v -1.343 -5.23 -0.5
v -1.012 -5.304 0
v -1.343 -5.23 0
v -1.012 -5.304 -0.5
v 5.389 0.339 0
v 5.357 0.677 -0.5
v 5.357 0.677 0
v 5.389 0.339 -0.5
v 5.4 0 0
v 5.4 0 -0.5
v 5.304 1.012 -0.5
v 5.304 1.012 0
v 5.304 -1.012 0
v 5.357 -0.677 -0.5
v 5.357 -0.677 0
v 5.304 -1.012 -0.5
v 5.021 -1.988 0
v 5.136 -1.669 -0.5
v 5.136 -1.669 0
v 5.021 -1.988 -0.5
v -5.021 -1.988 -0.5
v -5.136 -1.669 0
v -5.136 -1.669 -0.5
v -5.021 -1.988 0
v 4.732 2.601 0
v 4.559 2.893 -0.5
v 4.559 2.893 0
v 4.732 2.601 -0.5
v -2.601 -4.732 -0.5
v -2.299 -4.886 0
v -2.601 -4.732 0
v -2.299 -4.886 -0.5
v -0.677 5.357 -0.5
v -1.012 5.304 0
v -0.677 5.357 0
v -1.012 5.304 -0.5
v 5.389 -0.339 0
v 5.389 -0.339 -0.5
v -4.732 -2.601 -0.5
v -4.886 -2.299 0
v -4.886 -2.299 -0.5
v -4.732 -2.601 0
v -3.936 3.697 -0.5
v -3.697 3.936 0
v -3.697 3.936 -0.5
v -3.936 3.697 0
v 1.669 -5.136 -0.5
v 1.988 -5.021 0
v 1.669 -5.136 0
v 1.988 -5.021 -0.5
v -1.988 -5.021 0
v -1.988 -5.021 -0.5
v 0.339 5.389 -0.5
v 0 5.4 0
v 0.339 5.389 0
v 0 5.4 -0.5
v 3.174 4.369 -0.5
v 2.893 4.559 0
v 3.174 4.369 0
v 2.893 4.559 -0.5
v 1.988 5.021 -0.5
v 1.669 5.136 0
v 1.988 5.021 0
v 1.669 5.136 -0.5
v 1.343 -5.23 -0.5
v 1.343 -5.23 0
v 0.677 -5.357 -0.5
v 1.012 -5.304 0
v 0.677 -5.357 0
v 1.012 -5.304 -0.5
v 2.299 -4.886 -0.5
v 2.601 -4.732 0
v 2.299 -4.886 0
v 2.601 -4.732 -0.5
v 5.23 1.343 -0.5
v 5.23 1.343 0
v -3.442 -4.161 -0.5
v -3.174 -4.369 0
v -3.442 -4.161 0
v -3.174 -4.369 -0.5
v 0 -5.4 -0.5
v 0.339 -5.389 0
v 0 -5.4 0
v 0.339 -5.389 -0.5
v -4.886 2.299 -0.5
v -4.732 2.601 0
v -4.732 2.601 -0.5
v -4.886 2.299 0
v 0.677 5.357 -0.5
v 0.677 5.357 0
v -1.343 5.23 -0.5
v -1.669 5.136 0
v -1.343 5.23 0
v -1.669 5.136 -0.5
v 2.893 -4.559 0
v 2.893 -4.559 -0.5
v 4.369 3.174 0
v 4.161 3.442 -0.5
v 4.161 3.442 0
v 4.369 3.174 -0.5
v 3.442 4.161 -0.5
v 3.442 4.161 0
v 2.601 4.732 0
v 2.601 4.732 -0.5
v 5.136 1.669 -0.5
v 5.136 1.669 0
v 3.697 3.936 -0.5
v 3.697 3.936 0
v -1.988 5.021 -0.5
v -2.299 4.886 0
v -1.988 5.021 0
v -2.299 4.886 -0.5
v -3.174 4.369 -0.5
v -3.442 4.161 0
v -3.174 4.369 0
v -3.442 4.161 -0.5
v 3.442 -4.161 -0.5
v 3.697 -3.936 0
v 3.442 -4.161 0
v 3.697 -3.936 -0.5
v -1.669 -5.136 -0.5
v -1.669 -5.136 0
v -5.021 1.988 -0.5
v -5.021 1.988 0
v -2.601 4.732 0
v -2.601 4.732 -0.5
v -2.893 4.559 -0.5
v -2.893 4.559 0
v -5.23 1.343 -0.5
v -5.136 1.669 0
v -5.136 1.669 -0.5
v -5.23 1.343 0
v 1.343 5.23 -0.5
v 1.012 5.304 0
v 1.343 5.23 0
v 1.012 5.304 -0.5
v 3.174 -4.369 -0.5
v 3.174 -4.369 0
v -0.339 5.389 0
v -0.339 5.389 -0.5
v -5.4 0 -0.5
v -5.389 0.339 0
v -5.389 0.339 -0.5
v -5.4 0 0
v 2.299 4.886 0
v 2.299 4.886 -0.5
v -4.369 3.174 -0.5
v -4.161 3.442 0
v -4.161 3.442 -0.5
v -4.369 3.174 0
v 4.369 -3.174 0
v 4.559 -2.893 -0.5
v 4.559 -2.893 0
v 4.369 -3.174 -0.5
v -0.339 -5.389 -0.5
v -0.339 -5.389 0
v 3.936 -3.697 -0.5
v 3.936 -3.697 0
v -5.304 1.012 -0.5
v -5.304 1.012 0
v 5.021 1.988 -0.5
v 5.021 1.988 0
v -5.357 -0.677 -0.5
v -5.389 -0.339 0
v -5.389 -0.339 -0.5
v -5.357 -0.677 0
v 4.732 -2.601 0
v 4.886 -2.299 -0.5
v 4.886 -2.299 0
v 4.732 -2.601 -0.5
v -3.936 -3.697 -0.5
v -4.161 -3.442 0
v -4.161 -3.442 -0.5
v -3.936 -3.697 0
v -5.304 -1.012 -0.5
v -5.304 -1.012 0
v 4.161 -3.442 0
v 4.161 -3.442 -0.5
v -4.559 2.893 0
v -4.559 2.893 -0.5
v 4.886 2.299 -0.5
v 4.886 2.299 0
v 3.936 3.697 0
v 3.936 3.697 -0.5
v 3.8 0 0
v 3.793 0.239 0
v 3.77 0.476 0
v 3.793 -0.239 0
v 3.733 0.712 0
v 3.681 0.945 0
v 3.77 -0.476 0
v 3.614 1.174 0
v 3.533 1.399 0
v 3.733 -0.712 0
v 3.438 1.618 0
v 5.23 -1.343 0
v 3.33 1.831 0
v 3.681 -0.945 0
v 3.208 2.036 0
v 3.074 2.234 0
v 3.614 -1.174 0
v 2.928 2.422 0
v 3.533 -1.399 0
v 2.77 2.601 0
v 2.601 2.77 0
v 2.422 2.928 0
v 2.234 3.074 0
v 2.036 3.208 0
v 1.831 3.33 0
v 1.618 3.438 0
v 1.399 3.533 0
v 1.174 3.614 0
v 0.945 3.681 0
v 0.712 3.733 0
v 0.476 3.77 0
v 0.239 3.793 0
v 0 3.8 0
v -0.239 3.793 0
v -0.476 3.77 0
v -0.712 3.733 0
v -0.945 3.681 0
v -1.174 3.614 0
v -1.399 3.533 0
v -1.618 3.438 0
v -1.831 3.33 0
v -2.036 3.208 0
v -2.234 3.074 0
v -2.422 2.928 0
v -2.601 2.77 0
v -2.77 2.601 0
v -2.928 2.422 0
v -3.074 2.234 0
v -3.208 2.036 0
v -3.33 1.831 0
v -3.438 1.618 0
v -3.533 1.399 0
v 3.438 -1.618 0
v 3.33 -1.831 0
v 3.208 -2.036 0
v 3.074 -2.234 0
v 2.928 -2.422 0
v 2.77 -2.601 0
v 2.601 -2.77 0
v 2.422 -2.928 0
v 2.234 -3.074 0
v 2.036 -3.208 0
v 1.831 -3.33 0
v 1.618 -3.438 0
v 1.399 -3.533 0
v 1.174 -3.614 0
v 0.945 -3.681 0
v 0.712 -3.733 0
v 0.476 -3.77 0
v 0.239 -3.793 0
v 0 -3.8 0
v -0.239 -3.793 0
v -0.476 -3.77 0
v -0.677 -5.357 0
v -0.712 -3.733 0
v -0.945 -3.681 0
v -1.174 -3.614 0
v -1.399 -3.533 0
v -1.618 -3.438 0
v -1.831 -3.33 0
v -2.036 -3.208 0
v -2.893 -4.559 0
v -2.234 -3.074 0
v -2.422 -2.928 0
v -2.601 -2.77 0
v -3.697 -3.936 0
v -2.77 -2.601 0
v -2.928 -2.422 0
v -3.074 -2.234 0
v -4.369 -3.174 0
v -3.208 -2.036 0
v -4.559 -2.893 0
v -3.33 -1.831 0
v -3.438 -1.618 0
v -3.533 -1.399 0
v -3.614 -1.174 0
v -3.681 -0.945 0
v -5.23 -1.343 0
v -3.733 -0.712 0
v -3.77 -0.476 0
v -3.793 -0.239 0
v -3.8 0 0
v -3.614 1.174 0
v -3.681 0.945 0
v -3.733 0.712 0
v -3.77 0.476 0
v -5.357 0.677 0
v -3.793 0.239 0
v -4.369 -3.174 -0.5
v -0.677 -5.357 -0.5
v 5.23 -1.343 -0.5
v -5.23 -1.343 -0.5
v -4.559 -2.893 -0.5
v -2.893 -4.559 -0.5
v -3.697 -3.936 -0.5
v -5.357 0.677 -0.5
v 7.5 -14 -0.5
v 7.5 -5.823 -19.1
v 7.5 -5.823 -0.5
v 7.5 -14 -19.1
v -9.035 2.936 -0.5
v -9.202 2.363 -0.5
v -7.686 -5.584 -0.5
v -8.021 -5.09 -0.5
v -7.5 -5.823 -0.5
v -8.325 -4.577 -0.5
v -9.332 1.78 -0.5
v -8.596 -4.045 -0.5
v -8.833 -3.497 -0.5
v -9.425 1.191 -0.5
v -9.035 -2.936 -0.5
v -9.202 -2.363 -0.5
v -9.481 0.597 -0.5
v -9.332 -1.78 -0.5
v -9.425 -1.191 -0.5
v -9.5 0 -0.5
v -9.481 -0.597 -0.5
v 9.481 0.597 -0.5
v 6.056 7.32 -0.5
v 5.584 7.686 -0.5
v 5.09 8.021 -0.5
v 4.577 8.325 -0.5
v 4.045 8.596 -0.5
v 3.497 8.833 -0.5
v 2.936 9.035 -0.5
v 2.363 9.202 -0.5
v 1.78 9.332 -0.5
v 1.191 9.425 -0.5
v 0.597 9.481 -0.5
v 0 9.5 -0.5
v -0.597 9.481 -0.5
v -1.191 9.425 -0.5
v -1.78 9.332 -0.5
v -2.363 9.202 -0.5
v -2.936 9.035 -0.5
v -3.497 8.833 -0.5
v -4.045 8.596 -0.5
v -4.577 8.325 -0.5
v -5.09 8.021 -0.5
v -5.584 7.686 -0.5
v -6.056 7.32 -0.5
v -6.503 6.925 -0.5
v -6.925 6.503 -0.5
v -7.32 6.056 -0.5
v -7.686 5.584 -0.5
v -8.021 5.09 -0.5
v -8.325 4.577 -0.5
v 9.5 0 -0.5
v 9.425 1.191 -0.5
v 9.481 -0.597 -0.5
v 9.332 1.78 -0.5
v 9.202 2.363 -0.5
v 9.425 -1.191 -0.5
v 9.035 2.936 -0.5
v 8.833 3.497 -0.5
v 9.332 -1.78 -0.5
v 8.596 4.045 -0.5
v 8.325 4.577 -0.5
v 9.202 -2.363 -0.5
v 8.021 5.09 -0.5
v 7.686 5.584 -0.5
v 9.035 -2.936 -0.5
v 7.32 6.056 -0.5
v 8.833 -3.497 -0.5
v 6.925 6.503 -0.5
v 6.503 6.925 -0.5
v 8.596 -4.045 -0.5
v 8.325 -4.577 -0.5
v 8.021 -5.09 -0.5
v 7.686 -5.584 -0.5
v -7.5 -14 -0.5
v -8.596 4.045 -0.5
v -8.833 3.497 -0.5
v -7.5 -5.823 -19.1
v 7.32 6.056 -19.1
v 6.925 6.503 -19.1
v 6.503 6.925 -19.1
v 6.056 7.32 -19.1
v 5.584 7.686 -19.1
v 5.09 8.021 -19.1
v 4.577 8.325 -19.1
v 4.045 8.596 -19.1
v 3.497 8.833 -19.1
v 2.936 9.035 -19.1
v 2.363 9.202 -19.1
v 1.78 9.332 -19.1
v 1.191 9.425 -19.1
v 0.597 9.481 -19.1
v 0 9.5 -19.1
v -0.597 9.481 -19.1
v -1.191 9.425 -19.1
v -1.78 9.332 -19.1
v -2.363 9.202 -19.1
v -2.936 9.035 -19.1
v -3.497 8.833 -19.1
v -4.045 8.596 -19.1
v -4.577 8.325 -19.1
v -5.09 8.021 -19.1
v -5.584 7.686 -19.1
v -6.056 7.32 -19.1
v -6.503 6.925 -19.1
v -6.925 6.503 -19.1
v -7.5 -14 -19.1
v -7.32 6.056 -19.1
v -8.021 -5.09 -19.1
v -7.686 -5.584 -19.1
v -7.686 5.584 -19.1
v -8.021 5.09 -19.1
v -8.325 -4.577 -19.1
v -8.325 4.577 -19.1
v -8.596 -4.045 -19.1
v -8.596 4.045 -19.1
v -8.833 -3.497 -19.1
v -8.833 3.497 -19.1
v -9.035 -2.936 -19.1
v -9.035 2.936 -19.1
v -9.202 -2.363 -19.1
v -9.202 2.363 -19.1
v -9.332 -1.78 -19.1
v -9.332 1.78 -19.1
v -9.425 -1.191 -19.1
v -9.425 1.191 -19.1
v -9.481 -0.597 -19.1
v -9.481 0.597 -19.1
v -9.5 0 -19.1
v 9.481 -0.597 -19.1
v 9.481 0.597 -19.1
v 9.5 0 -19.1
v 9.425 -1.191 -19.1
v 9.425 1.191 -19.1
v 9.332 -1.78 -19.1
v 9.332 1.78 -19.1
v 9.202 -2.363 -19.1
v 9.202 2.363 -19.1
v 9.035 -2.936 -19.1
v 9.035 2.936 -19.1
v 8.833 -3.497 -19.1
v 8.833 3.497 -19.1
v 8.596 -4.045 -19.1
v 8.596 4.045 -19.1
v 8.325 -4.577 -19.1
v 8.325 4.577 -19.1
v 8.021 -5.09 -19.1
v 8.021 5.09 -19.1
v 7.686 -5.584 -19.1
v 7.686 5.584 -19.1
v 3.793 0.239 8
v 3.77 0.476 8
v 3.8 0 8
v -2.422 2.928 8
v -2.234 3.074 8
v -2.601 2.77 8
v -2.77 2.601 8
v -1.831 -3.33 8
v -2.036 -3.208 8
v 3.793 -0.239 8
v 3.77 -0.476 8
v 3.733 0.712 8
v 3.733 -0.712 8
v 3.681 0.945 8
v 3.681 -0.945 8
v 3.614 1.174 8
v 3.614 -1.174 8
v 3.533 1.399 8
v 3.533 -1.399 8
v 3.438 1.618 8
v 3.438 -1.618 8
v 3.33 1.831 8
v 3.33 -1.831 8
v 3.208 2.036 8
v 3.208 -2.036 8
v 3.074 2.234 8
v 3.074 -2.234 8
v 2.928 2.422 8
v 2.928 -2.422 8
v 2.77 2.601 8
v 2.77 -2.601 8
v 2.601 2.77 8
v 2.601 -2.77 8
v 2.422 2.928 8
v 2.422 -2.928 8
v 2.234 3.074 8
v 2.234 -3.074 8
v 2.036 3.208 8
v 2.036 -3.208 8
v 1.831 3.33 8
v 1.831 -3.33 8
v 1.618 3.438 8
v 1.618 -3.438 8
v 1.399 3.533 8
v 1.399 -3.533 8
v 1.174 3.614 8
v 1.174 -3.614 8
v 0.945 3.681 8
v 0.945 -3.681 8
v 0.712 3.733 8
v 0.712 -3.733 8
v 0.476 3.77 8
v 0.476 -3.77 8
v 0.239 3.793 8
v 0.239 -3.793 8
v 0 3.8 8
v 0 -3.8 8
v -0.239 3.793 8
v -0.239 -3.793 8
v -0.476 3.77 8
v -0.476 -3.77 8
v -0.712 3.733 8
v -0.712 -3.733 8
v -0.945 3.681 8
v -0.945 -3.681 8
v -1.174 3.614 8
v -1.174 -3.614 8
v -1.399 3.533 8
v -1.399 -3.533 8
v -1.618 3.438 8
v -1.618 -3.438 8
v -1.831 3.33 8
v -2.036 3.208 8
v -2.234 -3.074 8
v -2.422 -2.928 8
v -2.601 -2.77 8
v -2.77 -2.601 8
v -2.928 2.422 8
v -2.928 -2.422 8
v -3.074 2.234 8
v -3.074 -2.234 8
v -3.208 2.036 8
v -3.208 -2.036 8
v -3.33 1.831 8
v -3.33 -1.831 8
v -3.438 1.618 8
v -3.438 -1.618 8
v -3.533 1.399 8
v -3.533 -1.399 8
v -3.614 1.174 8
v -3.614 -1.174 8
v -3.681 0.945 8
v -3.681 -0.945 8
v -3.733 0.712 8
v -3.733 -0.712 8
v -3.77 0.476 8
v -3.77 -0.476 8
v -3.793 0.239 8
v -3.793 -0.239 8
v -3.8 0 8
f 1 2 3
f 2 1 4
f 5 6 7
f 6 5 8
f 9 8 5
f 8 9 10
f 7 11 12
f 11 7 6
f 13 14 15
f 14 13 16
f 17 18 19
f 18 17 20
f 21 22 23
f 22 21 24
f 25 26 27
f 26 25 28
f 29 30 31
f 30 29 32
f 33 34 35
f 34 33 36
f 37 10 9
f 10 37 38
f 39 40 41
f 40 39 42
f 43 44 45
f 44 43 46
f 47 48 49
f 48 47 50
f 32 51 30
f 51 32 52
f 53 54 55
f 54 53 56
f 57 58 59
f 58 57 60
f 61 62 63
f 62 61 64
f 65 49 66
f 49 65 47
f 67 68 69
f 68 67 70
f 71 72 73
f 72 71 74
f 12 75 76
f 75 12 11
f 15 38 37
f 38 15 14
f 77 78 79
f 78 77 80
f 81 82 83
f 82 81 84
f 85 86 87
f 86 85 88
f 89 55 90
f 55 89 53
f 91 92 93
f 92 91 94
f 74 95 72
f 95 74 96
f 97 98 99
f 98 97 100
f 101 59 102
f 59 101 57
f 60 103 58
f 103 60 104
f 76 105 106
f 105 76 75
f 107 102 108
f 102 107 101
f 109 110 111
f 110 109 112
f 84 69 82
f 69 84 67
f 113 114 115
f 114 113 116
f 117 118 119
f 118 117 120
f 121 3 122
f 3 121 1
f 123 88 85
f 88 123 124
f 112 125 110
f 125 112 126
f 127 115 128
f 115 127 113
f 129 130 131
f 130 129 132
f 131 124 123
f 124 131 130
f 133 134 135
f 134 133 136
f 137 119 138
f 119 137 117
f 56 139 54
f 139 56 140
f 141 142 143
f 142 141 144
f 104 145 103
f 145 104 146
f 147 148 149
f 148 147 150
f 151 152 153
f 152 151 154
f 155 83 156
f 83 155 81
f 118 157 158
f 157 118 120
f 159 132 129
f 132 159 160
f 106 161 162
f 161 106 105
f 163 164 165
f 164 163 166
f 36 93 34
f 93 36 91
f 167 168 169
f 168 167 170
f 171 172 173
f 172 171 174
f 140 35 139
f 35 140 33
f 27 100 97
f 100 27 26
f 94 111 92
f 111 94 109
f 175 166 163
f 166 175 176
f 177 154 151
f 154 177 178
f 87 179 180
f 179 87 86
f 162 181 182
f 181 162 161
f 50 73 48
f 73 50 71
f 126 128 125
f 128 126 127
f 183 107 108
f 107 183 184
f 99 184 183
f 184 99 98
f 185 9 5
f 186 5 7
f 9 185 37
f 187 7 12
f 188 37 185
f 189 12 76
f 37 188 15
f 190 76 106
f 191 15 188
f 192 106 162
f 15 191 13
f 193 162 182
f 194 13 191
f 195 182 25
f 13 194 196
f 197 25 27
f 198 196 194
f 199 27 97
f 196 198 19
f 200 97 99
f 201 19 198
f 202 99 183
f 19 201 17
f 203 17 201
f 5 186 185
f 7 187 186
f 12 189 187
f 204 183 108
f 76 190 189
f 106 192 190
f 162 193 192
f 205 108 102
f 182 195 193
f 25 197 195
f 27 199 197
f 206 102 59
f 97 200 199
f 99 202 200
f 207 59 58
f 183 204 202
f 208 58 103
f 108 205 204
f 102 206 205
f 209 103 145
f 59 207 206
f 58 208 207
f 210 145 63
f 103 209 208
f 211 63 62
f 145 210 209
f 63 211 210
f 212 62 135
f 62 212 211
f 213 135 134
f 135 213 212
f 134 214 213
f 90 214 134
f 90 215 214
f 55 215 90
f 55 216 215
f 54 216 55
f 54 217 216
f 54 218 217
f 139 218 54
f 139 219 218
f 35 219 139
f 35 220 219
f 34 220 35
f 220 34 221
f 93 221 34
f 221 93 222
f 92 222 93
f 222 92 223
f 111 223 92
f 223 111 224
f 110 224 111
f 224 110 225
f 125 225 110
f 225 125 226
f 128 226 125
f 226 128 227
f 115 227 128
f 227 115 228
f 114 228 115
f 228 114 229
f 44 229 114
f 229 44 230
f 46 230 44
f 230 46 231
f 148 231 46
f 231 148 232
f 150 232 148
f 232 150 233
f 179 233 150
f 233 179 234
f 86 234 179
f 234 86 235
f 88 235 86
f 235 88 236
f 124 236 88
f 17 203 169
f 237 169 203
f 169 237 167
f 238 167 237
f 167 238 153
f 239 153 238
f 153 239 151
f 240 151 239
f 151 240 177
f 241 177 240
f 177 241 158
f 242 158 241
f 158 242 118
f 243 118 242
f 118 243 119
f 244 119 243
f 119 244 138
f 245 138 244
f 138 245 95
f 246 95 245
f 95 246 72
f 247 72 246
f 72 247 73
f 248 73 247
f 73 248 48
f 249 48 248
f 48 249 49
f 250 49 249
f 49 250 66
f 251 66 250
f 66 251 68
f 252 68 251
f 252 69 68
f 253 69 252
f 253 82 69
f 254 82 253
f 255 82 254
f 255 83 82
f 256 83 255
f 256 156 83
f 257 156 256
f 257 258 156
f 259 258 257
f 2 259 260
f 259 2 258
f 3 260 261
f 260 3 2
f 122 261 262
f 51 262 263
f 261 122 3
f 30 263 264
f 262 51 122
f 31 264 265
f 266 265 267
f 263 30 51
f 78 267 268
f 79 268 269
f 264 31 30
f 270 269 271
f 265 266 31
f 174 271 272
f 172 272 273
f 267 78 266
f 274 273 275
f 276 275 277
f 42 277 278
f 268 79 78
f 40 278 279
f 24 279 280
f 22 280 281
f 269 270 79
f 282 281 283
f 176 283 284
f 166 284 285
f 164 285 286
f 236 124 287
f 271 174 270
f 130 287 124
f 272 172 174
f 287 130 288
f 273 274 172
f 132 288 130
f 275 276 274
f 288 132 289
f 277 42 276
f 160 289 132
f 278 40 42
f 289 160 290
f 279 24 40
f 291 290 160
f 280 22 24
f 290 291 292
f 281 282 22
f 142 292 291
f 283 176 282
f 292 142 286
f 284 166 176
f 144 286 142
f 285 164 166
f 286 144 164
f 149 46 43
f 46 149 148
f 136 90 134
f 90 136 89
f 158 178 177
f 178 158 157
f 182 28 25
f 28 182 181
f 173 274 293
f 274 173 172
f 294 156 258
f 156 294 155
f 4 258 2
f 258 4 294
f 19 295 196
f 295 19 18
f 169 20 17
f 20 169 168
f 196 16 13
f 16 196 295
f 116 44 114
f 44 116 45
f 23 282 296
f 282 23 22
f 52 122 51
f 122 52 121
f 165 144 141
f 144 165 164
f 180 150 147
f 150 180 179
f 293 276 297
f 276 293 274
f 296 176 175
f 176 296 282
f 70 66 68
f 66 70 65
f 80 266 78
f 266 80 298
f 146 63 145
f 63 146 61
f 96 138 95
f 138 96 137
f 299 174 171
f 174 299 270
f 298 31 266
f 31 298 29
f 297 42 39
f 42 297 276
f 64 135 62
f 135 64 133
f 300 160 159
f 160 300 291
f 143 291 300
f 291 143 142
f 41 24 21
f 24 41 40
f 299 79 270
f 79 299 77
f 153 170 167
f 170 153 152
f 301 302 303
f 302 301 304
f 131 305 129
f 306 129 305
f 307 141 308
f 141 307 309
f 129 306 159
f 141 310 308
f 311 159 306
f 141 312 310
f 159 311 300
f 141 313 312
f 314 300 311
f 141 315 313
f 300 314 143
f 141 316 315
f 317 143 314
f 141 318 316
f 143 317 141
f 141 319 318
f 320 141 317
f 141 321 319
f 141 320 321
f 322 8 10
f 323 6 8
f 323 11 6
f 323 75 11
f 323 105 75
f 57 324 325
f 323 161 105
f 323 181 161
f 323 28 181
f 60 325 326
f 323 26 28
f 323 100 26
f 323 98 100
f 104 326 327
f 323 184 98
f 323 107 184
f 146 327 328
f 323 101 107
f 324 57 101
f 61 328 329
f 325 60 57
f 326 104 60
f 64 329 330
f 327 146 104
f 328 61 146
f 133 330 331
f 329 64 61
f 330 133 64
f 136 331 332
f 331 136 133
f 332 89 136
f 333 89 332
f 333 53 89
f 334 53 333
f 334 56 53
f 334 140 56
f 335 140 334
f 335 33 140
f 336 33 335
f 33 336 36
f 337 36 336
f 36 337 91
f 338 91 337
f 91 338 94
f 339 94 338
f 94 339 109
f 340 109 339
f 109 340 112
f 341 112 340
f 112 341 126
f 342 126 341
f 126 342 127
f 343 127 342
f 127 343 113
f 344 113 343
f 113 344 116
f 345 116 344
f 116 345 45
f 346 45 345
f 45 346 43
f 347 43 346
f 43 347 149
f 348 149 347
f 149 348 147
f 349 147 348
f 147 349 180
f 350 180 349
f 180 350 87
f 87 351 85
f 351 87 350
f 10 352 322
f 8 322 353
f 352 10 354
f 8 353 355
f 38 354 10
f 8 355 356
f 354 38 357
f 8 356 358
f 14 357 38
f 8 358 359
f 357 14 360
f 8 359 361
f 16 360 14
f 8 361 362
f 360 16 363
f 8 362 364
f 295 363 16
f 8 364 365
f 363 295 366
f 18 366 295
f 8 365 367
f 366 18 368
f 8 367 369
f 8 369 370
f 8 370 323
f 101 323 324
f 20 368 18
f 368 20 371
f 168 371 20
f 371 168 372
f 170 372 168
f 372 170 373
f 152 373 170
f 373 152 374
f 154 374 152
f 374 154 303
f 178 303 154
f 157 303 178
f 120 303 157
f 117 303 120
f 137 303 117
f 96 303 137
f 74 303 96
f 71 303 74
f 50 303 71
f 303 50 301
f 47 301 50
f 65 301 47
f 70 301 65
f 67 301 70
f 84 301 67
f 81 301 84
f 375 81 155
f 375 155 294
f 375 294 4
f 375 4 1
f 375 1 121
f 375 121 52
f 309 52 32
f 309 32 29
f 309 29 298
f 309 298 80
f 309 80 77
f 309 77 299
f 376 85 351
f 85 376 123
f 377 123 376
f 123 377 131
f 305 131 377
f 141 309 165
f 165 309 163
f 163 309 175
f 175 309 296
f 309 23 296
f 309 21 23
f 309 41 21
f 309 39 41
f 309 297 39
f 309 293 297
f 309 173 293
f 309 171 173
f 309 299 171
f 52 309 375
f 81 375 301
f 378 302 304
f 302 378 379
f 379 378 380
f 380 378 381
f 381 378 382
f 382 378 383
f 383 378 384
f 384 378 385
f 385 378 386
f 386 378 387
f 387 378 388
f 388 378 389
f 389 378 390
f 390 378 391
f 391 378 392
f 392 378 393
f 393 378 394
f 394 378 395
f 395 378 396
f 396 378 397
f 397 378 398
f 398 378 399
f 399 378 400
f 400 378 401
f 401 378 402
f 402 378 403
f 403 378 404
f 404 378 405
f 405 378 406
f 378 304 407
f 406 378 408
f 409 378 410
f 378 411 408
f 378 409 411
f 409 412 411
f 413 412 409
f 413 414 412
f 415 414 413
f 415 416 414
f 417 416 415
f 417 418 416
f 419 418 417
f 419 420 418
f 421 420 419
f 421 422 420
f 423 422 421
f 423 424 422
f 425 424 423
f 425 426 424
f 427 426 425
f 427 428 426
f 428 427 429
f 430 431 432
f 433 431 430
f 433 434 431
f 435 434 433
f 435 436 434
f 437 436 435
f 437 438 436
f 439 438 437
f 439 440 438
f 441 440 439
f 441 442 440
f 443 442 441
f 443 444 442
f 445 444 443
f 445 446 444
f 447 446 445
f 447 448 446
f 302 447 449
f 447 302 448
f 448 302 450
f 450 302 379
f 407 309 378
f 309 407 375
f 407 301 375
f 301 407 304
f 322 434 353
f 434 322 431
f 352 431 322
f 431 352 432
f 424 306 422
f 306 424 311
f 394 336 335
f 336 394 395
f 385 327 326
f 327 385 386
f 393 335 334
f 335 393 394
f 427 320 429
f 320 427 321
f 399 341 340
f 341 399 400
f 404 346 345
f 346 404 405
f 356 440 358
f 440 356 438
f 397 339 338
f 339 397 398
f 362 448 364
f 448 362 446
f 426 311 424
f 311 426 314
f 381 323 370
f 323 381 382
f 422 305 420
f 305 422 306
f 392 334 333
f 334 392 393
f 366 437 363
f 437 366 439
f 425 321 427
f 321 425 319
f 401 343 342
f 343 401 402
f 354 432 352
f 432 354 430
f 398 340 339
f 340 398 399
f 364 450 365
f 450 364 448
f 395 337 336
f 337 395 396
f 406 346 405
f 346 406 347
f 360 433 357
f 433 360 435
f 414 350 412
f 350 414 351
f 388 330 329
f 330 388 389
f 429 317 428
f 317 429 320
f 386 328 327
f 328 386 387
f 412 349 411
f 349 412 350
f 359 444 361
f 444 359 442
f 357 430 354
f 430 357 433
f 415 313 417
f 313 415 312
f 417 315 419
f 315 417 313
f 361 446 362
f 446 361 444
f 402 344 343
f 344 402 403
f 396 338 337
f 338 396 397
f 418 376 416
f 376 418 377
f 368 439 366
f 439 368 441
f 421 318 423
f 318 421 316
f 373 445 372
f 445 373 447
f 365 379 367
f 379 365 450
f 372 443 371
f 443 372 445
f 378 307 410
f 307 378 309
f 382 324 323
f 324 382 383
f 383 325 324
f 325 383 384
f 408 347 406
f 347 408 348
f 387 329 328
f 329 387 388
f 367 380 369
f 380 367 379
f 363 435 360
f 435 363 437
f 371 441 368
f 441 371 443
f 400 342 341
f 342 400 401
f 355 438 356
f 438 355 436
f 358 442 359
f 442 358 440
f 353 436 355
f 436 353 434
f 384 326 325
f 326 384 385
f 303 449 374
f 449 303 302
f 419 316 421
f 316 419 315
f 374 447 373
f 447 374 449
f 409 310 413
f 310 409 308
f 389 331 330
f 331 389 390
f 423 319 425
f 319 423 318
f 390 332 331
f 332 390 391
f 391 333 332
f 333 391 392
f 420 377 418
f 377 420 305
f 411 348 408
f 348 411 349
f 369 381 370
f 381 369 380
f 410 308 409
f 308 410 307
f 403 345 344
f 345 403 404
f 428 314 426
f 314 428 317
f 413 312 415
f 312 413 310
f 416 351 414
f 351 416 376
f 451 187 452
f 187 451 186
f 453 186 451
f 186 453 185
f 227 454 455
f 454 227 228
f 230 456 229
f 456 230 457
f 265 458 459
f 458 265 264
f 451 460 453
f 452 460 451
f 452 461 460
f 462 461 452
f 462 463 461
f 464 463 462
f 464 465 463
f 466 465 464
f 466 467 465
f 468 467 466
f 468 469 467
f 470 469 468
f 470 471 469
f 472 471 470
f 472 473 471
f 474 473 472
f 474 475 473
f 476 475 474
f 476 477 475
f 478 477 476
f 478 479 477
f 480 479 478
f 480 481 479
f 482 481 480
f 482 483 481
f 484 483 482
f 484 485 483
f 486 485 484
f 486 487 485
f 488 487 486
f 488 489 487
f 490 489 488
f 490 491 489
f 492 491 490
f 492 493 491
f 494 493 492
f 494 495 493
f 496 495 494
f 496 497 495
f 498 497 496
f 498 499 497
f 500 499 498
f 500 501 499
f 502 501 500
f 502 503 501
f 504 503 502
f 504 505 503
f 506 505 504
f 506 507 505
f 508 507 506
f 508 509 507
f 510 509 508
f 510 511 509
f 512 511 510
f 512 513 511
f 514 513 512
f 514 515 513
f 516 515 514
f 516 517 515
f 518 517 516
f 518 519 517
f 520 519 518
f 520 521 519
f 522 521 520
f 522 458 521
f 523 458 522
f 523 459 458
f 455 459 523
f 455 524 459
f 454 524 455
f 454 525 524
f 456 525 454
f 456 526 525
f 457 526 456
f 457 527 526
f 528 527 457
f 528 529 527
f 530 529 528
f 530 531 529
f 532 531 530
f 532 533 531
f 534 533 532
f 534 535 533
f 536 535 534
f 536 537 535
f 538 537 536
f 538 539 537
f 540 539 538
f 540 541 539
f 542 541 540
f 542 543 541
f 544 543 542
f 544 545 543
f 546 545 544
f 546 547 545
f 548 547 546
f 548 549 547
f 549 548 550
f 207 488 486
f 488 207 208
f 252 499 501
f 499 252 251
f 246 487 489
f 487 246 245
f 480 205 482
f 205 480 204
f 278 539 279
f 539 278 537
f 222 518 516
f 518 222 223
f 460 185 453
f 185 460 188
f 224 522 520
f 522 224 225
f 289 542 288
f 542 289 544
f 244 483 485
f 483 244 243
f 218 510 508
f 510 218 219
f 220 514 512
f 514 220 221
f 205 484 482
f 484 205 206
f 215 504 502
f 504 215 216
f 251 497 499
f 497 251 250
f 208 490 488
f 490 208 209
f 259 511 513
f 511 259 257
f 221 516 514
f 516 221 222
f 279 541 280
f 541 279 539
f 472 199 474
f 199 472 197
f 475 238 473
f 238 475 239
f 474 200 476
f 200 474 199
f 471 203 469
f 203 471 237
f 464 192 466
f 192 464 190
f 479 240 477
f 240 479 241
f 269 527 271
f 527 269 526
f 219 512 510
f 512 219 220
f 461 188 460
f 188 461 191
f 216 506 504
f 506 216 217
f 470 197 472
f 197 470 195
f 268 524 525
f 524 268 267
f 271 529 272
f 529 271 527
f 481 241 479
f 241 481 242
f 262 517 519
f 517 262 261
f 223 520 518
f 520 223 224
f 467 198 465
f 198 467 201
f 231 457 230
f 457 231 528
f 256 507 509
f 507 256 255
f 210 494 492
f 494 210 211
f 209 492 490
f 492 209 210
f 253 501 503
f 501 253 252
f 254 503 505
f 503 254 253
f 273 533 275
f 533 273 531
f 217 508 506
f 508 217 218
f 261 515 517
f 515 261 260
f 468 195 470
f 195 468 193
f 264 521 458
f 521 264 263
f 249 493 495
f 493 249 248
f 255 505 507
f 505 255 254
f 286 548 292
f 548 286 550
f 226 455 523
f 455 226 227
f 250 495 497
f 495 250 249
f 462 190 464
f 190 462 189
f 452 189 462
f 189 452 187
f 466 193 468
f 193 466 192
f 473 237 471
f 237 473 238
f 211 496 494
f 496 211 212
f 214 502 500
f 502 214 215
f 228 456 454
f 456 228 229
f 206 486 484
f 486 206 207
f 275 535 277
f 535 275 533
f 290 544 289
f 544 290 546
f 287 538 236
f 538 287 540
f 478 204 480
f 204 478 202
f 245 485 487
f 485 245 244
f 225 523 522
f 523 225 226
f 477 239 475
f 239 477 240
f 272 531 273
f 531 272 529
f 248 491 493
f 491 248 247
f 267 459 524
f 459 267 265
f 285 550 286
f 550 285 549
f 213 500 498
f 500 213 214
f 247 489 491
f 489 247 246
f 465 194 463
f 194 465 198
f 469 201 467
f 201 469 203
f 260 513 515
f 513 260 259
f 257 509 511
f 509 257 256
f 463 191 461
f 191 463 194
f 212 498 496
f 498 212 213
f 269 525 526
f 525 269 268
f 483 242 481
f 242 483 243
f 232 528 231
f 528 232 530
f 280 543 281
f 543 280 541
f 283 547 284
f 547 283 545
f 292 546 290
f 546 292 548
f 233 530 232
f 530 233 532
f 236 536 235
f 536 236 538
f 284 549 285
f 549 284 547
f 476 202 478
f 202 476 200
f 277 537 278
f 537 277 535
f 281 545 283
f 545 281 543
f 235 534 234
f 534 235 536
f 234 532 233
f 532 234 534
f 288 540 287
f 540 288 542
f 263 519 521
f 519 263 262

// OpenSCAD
$fn=100; 

module pot_alpha_16mm(){
    
    
    shaft_height = 8;
    translate([0, 0, shaft_height/2]){
        cylinder(r=3.8, h=shaft_height, center=true);
    }
    
    translate([0, 0, -0.5]){
        cylinder(r=5.4, h=1, center=true);
        
        body_height = 18.6;
        
        translate([-7.5, -14, -body_height]) cube([15, 14, body_height]);
        translate([0, 0, -body_height/2]){
            cylinder(r=9.5, h=body_height, center=true);
            
        }      
    }
    

}

pot_alpha_16mm();
